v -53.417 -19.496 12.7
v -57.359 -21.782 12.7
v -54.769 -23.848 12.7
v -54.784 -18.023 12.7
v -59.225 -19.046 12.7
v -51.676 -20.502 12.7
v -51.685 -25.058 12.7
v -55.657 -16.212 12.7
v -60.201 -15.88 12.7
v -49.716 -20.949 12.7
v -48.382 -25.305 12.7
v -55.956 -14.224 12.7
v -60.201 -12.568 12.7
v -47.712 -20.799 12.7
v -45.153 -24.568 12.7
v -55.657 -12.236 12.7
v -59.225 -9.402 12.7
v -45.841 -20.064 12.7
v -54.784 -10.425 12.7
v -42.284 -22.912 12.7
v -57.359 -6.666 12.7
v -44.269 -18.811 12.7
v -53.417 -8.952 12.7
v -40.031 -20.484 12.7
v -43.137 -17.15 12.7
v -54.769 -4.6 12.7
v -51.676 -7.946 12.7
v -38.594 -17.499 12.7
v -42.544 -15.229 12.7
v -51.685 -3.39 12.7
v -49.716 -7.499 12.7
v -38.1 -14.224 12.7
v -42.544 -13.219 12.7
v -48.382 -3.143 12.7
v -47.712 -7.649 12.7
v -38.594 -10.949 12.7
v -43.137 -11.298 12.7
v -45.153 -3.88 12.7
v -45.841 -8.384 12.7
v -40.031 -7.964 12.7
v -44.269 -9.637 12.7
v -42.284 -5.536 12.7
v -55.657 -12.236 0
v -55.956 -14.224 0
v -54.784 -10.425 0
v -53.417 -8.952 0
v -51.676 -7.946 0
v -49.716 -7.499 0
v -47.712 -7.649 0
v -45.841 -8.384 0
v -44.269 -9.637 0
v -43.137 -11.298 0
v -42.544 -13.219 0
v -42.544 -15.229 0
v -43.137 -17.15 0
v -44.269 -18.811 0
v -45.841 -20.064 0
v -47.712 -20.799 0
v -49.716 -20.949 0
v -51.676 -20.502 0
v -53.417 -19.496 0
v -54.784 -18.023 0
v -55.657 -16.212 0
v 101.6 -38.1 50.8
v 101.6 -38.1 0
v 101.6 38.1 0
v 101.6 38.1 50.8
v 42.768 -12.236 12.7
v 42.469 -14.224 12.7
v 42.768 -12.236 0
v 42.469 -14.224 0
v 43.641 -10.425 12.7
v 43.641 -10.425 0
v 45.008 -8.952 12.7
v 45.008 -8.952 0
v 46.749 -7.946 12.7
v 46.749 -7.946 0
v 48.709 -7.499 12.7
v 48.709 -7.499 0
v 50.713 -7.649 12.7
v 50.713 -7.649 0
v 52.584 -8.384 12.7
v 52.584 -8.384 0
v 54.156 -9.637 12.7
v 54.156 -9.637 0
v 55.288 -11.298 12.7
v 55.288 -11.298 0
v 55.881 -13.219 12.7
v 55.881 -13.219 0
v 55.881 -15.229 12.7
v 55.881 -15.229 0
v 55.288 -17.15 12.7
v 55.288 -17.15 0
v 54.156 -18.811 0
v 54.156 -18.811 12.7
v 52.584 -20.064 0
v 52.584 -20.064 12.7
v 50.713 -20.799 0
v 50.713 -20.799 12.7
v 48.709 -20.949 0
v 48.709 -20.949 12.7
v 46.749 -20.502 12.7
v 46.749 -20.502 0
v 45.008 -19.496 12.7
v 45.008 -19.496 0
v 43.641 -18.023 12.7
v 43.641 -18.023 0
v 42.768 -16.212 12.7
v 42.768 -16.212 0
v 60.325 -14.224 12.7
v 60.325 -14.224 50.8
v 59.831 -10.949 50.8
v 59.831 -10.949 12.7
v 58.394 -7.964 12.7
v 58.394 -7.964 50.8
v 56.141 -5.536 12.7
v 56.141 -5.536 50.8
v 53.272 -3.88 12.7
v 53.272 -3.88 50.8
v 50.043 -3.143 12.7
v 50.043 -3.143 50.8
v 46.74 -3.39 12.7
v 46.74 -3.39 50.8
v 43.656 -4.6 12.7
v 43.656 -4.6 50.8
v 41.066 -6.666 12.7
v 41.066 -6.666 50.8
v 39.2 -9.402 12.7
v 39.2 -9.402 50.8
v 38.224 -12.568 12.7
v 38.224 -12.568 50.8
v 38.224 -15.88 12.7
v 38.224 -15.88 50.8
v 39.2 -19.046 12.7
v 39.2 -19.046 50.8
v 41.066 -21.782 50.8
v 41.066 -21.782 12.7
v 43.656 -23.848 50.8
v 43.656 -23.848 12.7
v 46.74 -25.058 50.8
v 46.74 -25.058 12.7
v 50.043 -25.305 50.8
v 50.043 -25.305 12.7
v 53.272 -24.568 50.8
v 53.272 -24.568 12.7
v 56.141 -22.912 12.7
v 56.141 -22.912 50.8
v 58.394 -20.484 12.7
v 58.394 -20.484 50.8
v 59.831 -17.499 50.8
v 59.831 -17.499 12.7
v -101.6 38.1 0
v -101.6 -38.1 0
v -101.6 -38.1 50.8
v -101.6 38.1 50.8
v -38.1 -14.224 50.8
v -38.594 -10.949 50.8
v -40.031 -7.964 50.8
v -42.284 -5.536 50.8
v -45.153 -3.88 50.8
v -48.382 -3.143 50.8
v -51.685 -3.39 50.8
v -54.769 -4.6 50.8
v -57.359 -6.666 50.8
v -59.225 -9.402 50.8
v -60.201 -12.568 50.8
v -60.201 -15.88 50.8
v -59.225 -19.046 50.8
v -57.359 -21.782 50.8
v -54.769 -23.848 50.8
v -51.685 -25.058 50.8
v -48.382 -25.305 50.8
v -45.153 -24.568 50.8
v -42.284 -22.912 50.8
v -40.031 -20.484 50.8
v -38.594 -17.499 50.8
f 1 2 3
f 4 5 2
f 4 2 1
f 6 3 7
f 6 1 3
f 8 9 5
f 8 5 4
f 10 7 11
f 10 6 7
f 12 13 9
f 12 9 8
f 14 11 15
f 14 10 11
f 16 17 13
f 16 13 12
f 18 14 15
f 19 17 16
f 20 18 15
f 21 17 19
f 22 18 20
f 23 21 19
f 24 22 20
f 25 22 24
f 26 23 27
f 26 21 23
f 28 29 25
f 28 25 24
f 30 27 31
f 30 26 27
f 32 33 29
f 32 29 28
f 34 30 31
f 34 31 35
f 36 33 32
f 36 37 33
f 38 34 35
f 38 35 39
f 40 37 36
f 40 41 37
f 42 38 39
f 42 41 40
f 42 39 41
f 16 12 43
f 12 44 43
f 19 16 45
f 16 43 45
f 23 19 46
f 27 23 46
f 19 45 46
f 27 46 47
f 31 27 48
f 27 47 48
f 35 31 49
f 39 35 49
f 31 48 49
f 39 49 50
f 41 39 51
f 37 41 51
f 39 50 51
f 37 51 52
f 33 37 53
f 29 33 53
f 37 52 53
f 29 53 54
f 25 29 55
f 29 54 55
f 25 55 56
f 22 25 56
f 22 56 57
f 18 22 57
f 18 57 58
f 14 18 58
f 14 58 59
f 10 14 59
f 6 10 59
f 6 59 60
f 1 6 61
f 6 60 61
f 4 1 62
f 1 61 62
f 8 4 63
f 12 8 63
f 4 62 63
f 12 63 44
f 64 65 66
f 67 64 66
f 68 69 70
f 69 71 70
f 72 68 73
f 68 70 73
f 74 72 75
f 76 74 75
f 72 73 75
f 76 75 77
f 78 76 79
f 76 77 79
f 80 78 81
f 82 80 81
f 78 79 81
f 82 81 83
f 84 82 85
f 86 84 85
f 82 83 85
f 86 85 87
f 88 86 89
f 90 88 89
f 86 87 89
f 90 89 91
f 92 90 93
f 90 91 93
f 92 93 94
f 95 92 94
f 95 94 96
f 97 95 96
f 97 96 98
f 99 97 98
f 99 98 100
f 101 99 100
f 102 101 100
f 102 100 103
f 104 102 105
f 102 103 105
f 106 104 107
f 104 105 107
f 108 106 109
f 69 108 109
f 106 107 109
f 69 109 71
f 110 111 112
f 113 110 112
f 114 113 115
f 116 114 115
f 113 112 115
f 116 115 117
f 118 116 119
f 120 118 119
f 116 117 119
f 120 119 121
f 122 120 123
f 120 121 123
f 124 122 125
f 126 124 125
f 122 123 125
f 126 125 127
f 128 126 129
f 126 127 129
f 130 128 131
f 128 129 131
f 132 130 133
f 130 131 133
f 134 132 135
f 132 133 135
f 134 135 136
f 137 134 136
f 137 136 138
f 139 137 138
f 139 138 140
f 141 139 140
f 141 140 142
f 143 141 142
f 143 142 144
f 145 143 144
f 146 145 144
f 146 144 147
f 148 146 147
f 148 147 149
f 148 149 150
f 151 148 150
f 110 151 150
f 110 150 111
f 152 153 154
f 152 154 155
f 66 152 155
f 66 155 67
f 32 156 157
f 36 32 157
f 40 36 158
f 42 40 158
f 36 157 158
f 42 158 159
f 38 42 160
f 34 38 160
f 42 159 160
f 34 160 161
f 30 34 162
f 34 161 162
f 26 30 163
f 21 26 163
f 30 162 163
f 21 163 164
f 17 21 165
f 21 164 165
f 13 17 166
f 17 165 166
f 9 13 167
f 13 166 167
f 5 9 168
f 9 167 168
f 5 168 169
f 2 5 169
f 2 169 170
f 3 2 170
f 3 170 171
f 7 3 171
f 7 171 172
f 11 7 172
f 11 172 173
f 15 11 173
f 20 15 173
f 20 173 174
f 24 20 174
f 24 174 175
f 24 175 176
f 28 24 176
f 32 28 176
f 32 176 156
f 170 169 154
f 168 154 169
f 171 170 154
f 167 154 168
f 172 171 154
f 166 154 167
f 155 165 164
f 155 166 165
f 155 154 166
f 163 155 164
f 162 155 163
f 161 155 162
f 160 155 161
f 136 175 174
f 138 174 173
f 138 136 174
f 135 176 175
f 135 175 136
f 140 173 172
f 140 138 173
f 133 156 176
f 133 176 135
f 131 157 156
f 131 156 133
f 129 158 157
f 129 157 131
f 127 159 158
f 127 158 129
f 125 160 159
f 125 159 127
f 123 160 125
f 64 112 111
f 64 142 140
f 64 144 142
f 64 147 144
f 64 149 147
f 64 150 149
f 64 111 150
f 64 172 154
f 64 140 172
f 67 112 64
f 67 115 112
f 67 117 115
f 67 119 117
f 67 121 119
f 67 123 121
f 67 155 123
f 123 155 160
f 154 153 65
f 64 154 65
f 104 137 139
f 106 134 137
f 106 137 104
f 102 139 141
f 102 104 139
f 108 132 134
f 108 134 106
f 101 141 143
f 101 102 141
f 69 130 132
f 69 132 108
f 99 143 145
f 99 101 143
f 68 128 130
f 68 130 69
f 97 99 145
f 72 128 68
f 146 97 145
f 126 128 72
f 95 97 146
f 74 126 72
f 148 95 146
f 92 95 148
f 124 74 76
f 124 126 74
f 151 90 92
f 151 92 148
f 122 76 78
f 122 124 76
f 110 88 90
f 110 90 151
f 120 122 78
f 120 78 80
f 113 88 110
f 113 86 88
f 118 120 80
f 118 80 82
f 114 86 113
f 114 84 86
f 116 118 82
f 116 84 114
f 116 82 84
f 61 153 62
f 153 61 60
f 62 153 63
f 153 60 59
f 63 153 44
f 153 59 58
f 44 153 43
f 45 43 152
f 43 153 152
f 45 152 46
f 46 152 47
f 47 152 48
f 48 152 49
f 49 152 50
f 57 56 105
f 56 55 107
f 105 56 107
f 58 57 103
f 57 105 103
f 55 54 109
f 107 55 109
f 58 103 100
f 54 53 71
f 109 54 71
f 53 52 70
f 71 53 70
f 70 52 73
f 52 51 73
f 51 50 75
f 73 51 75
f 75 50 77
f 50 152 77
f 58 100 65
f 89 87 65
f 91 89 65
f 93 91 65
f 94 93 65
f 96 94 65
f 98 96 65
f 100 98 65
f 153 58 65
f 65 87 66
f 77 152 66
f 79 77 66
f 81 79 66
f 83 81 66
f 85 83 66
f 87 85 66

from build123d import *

# Parameters (mm, degrees)
F0_W           = 203.2
F0_H           = 76.2
F1_DEPTH       = 50.8
F3_D           = 13.4874
F3_CBORE_D     = 22.225
F3_CBORE_DEPTH = 38.1


with BuildPart() as f1:
    # F0 (on Top) → F1 (new body)
    with BuildSketch(Plane.XY):
        Rectangle(F0_W, F0_H)
    extrude(amount=F1_DEPTH)

    # F3 (through all)
    with Locations(Plane.XY.offset(50.8)):
        with Locations((-49.2125, -14.224), (49.2125, -14.224)):
            CounterBoreHole(F3_D / 2, F3_CBORE_D / 2, F3_CBORE_DEPTH)


solid = f1.part
